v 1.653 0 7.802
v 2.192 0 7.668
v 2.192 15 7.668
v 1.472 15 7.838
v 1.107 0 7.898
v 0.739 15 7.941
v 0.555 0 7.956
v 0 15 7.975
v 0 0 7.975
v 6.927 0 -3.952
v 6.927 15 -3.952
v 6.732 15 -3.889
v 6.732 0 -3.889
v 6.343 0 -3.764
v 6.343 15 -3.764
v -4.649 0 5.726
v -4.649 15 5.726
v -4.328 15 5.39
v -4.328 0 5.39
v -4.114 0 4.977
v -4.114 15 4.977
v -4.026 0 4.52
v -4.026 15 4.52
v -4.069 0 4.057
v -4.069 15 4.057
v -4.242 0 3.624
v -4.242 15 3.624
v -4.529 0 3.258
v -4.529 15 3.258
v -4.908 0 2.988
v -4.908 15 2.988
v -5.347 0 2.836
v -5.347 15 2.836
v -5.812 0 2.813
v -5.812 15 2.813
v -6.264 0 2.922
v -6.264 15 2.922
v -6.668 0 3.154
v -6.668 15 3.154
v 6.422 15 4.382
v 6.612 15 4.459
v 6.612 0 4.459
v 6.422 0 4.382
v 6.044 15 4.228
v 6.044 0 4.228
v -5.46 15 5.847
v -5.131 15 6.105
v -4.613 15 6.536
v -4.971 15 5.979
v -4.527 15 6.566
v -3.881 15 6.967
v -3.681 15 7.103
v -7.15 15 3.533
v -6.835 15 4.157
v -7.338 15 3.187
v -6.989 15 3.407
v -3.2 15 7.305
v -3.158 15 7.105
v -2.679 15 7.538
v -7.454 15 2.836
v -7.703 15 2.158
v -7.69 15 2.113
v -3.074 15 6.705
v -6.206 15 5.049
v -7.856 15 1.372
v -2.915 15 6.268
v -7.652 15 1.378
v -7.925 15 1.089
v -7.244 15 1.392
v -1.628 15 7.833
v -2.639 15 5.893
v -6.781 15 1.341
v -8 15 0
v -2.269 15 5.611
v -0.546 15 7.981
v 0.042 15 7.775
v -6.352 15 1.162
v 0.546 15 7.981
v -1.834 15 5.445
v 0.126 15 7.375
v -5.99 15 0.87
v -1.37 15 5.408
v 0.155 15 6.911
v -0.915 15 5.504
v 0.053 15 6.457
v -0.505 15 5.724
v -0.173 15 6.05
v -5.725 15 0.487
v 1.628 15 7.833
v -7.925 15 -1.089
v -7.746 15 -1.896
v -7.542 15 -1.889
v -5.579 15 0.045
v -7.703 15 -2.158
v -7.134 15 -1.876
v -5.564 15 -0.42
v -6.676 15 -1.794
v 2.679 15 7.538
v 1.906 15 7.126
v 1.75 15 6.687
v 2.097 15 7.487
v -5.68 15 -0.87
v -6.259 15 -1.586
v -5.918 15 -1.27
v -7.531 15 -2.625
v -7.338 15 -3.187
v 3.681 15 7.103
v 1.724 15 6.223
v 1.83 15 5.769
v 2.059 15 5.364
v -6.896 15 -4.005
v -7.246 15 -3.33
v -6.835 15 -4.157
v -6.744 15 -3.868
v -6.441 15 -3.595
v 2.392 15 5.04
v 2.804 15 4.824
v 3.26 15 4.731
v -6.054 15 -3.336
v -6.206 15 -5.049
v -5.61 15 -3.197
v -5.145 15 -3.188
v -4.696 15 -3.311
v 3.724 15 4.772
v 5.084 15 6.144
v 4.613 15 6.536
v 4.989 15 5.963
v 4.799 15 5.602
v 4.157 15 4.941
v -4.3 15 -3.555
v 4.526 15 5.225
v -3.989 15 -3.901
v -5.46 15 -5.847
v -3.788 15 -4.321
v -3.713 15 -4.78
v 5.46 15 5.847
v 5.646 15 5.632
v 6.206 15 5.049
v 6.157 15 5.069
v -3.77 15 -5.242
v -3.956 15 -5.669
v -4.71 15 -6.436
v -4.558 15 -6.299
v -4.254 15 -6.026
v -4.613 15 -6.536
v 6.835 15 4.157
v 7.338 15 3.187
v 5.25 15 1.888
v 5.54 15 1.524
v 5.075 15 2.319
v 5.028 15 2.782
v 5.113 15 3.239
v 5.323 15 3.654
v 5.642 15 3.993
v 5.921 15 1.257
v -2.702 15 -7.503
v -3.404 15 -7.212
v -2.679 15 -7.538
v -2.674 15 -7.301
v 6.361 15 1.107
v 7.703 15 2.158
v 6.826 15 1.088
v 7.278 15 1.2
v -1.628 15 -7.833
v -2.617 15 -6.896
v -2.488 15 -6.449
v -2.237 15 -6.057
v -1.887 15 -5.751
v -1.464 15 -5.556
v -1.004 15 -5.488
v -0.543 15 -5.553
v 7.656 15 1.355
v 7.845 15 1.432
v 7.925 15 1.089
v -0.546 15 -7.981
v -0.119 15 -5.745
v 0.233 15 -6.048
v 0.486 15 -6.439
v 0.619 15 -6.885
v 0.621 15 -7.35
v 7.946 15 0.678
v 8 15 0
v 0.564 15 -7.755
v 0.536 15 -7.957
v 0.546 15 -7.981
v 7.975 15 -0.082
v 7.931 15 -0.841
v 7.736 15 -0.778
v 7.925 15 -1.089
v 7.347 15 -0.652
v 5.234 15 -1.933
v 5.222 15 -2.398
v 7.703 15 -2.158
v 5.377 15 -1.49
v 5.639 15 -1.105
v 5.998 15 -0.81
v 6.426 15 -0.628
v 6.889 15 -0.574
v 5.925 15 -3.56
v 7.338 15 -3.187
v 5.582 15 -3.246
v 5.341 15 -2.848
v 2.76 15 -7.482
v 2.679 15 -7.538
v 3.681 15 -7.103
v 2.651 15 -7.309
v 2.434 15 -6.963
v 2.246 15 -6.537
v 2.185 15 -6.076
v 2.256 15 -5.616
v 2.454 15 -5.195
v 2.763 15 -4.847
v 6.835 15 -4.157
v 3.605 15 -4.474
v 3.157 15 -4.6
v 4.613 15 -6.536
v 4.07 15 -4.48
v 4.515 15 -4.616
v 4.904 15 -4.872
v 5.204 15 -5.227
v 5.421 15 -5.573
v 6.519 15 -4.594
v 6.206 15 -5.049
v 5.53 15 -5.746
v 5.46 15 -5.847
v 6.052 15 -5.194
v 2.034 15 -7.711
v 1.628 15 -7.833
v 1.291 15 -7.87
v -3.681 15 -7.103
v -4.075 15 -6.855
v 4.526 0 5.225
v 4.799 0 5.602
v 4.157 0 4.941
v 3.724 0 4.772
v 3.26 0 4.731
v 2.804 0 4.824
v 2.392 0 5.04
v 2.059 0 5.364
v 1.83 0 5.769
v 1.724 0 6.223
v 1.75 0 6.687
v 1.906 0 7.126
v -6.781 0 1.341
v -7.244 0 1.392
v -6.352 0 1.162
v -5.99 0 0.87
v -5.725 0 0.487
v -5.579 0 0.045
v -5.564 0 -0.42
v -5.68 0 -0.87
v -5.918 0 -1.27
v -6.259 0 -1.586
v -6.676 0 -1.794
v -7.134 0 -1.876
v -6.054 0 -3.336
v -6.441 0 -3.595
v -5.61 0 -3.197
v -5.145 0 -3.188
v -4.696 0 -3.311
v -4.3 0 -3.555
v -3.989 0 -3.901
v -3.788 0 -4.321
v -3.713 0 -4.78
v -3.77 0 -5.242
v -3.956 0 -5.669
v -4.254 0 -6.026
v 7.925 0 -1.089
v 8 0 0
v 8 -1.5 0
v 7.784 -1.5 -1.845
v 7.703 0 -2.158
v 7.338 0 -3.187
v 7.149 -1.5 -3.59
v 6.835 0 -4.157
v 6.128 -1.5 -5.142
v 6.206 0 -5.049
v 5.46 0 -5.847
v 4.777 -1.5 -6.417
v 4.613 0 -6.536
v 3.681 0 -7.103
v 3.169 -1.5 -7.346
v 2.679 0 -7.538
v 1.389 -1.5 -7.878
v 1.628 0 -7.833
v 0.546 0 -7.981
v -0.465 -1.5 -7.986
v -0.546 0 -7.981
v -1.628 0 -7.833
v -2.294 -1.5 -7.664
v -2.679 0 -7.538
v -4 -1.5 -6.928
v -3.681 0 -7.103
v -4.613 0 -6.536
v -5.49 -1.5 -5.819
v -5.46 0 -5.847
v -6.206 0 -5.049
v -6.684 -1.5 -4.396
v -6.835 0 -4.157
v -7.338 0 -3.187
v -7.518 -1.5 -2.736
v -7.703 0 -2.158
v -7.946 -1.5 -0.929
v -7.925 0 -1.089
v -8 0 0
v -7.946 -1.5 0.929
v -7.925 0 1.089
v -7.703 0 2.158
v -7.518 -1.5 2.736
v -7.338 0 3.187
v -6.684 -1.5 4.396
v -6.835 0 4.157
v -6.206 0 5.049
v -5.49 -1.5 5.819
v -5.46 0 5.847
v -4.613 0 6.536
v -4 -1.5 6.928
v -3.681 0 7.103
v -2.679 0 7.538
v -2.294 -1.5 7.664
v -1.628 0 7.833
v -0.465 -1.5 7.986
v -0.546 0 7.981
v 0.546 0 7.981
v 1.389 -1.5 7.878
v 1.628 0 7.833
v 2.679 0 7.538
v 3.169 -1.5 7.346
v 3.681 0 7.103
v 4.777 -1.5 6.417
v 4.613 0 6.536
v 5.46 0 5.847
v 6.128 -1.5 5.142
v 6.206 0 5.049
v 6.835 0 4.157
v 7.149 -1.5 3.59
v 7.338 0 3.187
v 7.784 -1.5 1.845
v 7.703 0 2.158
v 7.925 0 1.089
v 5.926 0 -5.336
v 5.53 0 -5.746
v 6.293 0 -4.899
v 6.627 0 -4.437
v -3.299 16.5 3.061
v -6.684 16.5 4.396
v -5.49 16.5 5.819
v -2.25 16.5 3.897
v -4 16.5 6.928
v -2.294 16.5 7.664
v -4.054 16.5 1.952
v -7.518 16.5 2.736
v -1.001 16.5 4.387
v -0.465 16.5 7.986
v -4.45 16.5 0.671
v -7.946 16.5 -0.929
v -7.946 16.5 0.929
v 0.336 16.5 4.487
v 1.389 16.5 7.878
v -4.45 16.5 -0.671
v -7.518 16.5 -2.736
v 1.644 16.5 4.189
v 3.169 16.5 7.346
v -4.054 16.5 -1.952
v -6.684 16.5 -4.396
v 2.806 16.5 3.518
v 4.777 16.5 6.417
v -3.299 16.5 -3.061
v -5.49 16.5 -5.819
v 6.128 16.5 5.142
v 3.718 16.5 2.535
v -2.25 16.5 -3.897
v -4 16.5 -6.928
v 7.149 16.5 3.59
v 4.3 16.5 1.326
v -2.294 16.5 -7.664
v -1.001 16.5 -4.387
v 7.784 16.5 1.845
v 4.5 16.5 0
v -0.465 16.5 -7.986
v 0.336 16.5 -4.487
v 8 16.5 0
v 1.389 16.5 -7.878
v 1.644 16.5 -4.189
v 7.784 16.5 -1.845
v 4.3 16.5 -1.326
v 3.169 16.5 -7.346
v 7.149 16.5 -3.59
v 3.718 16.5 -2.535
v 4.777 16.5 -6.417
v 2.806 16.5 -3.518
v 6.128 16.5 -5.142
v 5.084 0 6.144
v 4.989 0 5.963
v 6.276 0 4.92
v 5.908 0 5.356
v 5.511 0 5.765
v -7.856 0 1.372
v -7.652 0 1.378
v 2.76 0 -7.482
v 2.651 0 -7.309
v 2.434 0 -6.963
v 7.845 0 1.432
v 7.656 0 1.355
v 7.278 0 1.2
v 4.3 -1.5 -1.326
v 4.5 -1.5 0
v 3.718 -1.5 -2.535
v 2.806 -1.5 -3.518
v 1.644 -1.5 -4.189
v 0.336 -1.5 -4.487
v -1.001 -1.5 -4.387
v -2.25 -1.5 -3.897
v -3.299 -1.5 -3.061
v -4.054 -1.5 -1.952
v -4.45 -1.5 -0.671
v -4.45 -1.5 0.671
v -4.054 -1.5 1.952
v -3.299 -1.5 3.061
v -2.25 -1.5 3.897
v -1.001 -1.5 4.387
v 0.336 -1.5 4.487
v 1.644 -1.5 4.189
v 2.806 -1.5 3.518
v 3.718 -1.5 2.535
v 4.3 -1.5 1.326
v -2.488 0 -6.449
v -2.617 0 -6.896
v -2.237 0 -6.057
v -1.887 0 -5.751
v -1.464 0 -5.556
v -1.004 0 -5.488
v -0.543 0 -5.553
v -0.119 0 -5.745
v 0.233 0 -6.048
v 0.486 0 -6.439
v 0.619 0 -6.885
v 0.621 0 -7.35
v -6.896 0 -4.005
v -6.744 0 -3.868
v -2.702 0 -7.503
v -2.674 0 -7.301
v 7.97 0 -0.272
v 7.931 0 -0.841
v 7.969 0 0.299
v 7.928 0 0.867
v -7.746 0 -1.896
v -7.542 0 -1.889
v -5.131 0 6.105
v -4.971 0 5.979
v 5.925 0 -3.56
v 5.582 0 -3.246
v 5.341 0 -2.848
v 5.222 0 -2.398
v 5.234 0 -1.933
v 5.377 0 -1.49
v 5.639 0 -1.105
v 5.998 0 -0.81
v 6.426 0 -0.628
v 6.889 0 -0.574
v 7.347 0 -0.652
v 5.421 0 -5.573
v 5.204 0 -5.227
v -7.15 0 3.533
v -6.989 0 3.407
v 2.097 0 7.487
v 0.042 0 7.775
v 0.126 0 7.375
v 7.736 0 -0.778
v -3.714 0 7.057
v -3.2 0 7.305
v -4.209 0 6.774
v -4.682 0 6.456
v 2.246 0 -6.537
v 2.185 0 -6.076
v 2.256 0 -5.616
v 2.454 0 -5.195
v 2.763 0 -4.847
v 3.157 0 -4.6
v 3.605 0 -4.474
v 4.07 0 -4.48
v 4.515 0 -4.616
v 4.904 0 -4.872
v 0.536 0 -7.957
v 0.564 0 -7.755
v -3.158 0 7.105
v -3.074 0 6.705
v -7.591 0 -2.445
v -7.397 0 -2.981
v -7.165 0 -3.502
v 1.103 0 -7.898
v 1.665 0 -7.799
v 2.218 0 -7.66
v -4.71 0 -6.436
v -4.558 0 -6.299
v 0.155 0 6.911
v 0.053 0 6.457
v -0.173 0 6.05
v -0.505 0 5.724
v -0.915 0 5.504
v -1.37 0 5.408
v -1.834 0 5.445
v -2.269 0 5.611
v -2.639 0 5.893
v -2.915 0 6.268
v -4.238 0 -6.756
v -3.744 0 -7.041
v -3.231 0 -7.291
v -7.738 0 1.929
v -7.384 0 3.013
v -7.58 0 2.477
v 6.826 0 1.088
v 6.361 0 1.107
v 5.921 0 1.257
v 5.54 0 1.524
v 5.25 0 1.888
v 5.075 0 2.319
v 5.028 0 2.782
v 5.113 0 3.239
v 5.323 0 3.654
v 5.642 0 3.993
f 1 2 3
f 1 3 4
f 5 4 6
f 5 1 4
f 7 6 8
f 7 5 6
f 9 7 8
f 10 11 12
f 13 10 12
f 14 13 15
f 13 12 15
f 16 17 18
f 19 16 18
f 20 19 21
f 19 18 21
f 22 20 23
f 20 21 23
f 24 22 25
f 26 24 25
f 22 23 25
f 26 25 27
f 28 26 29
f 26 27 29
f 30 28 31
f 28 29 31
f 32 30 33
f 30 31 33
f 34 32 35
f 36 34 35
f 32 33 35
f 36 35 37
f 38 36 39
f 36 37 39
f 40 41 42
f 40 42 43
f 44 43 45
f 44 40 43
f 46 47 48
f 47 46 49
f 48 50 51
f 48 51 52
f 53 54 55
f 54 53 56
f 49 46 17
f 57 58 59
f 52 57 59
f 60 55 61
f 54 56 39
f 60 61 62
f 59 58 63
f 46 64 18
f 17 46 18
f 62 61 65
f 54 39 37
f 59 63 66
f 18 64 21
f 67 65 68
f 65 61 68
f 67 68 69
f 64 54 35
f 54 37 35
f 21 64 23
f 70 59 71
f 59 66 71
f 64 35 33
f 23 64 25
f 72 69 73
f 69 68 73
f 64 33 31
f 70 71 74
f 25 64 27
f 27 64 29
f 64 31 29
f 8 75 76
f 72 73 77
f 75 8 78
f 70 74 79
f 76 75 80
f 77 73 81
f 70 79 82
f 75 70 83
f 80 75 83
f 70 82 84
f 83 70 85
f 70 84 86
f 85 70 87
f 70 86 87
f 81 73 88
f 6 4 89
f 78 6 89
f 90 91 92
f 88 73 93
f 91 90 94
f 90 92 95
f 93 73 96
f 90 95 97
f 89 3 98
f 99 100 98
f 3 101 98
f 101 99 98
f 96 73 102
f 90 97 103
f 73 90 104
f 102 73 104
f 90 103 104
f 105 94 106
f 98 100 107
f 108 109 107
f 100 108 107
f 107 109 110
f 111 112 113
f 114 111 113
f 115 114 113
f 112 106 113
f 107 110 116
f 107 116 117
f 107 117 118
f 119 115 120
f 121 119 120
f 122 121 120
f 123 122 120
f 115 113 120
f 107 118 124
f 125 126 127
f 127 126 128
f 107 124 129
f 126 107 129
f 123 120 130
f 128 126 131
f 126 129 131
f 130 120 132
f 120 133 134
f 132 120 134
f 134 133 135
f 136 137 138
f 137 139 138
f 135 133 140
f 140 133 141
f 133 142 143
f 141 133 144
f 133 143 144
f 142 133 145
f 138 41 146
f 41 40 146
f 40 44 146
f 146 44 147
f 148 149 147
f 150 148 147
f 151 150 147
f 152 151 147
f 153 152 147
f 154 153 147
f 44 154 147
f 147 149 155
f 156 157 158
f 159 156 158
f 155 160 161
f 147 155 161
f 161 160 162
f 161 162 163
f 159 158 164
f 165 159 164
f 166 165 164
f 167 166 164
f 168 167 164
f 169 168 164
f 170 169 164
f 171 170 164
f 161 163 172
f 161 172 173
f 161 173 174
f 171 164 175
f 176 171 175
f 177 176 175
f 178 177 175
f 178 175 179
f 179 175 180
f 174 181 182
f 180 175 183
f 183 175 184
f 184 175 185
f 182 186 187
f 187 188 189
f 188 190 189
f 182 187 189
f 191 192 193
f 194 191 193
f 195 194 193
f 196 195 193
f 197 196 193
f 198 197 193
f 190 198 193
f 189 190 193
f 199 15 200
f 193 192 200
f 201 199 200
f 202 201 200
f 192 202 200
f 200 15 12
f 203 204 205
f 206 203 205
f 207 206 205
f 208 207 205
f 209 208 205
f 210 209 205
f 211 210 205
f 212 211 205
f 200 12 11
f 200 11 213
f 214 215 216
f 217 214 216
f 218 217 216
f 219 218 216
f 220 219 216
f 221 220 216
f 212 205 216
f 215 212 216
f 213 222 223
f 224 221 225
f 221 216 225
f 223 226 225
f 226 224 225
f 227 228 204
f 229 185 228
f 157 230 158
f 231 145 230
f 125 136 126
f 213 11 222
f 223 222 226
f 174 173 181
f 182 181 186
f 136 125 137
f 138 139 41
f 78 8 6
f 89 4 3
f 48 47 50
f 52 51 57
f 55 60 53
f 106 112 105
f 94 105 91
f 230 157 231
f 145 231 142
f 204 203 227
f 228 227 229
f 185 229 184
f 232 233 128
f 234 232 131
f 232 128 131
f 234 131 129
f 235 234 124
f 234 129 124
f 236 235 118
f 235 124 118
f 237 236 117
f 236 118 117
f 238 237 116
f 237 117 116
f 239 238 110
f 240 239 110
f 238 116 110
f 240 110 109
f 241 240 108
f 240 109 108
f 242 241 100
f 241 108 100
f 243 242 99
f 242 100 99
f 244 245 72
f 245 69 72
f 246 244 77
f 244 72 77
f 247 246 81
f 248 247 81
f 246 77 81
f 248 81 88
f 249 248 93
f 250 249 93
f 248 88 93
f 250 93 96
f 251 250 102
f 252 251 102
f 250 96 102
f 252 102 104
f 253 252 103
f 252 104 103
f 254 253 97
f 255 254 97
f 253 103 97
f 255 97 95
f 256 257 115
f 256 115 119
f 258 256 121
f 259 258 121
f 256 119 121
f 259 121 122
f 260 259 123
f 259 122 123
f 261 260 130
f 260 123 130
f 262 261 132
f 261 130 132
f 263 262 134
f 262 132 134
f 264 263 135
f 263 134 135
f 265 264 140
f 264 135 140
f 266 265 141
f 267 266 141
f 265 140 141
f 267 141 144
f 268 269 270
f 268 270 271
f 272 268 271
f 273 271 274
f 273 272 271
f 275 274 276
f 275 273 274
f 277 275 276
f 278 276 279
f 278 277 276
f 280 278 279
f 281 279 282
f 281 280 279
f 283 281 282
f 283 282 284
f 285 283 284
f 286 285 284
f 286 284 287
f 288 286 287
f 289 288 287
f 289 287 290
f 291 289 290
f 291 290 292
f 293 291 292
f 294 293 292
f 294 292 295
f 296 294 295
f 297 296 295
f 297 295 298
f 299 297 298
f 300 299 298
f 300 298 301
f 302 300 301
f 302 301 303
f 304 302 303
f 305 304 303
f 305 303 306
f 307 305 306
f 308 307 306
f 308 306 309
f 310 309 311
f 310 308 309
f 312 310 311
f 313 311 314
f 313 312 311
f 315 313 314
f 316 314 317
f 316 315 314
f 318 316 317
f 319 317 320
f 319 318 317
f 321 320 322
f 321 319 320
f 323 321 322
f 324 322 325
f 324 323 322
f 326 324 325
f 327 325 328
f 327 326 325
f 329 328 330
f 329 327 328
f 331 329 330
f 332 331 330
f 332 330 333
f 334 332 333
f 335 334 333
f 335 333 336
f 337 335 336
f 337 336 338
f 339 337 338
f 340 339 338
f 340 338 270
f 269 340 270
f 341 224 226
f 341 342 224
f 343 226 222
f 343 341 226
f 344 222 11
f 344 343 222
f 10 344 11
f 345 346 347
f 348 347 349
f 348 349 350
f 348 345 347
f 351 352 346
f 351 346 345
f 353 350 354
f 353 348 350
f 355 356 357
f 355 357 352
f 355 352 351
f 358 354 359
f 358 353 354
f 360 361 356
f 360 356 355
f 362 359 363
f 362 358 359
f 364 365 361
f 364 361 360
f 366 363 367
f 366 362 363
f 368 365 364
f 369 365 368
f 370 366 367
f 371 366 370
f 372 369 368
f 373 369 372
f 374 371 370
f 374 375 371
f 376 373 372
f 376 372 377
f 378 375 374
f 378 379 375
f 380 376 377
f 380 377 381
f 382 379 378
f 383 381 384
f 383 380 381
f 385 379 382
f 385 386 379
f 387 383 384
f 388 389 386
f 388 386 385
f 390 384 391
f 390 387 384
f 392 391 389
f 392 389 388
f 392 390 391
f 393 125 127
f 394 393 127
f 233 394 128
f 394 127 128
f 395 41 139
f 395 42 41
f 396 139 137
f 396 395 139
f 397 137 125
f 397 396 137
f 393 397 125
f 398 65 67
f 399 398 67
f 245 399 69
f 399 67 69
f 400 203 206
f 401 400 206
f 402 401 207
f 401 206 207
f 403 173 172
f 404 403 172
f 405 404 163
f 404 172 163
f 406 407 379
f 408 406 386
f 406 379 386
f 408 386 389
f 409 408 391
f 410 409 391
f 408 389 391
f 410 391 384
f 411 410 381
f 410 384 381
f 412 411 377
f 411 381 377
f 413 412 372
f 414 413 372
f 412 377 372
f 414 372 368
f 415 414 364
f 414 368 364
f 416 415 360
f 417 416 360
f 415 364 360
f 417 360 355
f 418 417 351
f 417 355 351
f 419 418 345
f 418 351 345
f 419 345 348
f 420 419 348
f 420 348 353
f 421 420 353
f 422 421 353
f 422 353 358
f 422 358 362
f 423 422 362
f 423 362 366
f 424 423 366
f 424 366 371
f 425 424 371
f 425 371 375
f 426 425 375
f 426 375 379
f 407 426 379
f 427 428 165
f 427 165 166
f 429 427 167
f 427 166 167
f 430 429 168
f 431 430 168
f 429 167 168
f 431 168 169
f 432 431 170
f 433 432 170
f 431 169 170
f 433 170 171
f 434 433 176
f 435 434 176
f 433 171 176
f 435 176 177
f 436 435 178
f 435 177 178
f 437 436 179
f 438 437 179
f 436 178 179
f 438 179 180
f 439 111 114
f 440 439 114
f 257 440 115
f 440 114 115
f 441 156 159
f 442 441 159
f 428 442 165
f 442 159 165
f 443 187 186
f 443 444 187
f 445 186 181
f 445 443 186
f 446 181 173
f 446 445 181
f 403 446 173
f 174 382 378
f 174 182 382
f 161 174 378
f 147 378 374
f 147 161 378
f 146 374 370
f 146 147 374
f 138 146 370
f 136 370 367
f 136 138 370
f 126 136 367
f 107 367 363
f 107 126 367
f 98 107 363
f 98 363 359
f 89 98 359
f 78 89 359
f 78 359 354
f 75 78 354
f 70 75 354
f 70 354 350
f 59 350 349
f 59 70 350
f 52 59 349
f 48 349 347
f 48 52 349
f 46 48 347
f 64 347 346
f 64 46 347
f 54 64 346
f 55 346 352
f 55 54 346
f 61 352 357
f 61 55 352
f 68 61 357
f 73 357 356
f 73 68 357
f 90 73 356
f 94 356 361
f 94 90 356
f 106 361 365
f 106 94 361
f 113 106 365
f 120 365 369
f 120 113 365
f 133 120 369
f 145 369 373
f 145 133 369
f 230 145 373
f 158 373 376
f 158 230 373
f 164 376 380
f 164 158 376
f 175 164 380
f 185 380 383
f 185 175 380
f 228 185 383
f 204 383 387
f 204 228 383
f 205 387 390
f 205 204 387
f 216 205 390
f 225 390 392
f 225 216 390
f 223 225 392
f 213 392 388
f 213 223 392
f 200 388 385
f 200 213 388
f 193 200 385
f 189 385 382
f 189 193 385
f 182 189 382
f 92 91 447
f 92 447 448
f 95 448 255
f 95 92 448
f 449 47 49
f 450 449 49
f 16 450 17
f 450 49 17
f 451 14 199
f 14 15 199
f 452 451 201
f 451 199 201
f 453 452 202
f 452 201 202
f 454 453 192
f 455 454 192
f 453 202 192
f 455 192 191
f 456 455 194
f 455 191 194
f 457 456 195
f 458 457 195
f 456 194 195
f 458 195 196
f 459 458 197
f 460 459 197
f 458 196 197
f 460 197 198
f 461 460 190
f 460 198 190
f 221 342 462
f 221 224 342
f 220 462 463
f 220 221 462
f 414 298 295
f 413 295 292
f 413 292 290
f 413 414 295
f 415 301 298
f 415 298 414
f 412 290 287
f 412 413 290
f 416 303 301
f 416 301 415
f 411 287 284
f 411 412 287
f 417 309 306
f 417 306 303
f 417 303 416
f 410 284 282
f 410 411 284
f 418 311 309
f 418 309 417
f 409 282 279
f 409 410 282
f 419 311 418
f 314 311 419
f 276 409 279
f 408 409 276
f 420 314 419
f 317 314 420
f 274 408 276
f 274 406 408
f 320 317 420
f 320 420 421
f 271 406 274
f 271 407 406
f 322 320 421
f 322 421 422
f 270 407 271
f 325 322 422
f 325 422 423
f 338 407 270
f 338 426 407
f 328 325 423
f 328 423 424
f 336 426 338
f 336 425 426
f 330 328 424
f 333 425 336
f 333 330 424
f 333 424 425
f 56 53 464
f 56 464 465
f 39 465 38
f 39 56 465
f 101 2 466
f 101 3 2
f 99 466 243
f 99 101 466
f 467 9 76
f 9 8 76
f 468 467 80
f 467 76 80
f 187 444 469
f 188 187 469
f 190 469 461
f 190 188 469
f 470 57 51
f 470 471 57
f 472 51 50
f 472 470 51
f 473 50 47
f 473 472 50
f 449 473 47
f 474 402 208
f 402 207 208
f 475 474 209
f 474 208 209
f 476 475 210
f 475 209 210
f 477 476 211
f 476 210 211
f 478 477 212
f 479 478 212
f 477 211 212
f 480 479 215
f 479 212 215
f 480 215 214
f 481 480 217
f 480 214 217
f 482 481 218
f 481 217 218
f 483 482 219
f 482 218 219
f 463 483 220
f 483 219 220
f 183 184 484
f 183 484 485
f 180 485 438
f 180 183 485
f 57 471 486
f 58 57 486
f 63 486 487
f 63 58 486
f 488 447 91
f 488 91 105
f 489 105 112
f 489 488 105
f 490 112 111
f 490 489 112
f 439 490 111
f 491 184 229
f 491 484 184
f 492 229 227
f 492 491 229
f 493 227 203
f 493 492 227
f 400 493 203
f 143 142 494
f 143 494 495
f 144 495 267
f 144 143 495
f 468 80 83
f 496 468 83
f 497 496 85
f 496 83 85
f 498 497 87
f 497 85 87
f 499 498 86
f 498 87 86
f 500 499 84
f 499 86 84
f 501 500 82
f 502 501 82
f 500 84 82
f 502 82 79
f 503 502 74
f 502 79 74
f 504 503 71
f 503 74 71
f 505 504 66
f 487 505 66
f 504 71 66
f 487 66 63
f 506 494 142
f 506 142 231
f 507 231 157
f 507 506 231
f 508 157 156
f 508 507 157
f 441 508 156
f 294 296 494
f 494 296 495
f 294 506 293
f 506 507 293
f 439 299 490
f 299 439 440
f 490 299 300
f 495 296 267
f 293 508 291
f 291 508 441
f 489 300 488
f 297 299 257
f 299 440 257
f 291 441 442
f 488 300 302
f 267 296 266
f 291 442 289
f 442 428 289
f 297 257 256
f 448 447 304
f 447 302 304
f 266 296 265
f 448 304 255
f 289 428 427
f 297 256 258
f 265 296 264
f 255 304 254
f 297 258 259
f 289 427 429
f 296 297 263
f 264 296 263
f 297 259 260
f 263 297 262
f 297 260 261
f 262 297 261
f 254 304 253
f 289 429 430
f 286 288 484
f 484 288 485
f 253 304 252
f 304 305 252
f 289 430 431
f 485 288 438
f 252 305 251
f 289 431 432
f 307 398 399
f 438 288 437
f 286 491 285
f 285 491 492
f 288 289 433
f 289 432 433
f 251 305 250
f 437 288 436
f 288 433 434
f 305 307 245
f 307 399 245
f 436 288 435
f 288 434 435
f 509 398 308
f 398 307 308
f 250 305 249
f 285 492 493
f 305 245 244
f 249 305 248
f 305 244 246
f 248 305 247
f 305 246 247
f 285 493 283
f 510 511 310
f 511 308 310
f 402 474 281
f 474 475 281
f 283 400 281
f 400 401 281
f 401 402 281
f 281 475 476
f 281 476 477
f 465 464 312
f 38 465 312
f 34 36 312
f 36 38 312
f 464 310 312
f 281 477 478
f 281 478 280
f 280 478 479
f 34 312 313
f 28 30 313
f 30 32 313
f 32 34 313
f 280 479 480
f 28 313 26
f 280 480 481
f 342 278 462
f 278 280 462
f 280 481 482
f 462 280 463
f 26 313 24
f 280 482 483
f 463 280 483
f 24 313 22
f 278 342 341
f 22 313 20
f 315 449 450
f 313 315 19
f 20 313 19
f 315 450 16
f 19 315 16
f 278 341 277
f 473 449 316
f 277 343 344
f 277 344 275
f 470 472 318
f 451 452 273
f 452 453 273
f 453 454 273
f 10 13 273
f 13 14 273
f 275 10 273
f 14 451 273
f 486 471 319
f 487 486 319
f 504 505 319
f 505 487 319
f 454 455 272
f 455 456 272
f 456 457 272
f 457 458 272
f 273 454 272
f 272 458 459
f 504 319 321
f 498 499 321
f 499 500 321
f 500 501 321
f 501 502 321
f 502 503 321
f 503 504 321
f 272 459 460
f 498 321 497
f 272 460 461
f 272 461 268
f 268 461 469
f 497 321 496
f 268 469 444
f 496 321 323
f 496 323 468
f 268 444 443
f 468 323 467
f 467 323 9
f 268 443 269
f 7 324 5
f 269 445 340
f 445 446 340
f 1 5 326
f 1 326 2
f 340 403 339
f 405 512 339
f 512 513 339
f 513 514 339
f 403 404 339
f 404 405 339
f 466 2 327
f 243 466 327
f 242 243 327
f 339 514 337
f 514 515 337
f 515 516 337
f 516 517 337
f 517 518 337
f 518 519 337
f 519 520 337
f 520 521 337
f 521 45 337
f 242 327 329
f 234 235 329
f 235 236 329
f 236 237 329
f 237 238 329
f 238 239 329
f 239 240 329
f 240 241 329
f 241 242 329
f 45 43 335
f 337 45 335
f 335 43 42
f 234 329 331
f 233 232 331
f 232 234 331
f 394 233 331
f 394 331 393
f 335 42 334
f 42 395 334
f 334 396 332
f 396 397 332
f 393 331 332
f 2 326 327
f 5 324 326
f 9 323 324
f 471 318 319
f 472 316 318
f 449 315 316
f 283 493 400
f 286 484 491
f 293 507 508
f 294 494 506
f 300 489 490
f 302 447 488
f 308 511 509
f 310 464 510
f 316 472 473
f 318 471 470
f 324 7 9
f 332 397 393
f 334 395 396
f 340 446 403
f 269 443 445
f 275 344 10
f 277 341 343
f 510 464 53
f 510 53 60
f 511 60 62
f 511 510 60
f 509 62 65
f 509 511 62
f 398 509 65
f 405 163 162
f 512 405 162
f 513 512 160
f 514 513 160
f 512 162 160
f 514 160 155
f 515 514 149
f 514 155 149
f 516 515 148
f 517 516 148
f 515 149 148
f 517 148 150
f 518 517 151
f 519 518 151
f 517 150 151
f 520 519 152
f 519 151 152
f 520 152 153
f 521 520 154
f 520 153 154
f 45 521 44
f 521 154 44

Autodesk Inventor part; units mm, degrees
ref_plane "YZ Plane" through (0, 0, 0) normal (1, 0, 0) x (0, 1, 0)
ref_plane "XZ Plane" through (0, 0, 0) normal (0, 1, 0) x (-1, 0, 0)
ref_plane "XY Plane" through (0, 0, 0) normal (0, 0, 1) x (1, 0, 0)
sketch "Esquisse2" plane through (0, 0, 0) normal (0, 1, 0) x (-1, 0, 0)
  circle A0 centre (0, 0) radius 7.975
  dimension "d0" = 15.95
extrude "Extrusion1" add sketch "Esquisse2" along normal blind 15
sketch "Esquisse4" plane through (0, 15, 0) normal (0, 1, 0) x (1, 0, 0)
  circle A0 centre (0, 0) radius 7.975 projected
  circle A1 centre (0, 0) radius 7.975 projected
  arc A2 (-3.2, -7.3048) -> (0, -7.975) centre (0, 0) ccw
  line L0 (-0.0068, -0.0109) -> (-5.0602, -8.1445)
  line L1 (0, -6.3735) -> (0, 5.2233) construction
  line L2 (-3.2, -7.3048) -> (0, -7.975) construction
  line L3 (-3.2, -7.3048) -> (-3.0743, -6.7048)
  line L4 (0, -7.975) -> (0.1257, -7.375)
  arc A3 (0.1257, -7.375) -> (-3.0743, -6.7048) centre (-1.4743, -7.0399) ccw
  line L5 (-3.0743, -6.7048) -> (0.1257, -7.375) construction
  arc A4 (-7.1498, -3.5328) -> (-5.1314, -6.1048) centre (0, 0) ccw
  line L6 (-5.1314, -6.1048) -> (-7.1498, -3.5328) construction
  line L7 (-5.1314, -6.1048) -> (-4.6492, -5.7264)
  line L8 (-7.1498, -3.5328) -> (-6.6676, -3.1544)
  arc A5 (-4.6492, -5.7264) -> (-6.6676, -3.1544) centre (-5.6584, -4.4404) ccw
  line L9 (-4.6492, -5.7264) -> (-6.6676, -3.1544) construction
  line L10 (-5.1314, -6.1048) -> (-3.2, -7.3048) construction
  line L11 (0, 0) -> (-9.6935, -3.168)
  arc A6 (-4.7097, 6.4358) -> (-6.8963, 4.0051) centre (0, 0) ccw
  line L12 (-6.8963, 4.0051) -> (-4.7097, 6.4358) construction
  line L13 (-6.8963, 4.0051) -> (-6.4406, 3.5951)
  line L14 (-4.7097, 6.4358) -> (-4.254, 6.0258)
  arc A7 (-6.4406, 3.5951) -> (-4.254, 6.0258) centre (-5.3473, 4.8105) ccw
  line L15 (-6.4406, 3.5951) -> (-4.254, 6.0258) construction
  arc A8 (-7.7463, 1.8961) -> (-7.8562, -1.3715) centre (0, 0) ccw
  line L16 (-7.7463, 1.8961) -> (-7.8562, -1.3715) construction
  line L17 (-7.7463, 1.8961) -> (-7.1336, 1.8755)
  line L18 (-7.8562, -1.3715) -> (-7.2435, -1.3921)
  arc A9 (-7.2435, -1.3921) -> (-7.1336, 1.8755) centre (-7.1886, 0.2417) ccw
  line L19 (-7.1336, 1.8755) -> (-7.2435, -1.3921) construction
  line L20 (-7.7463, 1.8961) -> (-6.8963, 4.0051) construction
  line L21 (-7.8562, -1.3715) -> (-7.1498, -3.5328) construction
  line L22 (0, 0) -> (-3.9831, 7.4909)
  arc A10 (6.6117, -4.4594) -> (7.8454, -1.4316) centre (0, 0) ccw
  line L23 (7.8454, -1.4316) -> (6.6117, -4.4594) construction
  line L24 (7.8454, -1.4316) -> (7.2777, -1.2003)
  line L25 (6.6117, -4.4594) -> (6.044, -4.228)
  arc A11 (7.2777, -1.2003) -> (6.044, -4.228) centre (6.6609, -2.7142) ccw
  line L26 (7.2777, -1.2003) -> (6.044, -4.228) construction
  arc A12 (7.9306, 0.8406) -> (6.9268, 3.9522) centre (0, 0) ccw
  line L27 (7.9306, 0.8406) -> (6.9268, 3.9522) construction
  line L28 (7.9306, 0.8406) -> (7.3472, 0.6524)
  line L29 (6.9268, 3.9522) -> (6.3434, 3.764)
  arc A13 (6.3434, 3.764) -> (7.3472, 0.6524) centre (6.8453, 2.2082) ccw
  line L30 (7.3472, 0.6524) -> (6.3434, 3.764) construction
  line L31 (7.9306, 0.8406) -> (7.8454, -1.4316) construction
  line L32 (0.5357, 7.957) -> (0.6208, 7.3499)
  arc A14 (-2.617, 6.8962) -> (0.6208, 7.3499) centre (-0.9981, 7.1231) ccw
  line L33 (0.6208, 7.3499) -> (-2.617, 6.8962) construction
  line L34 (0.5357, 7.957) -> (-2.7021, 7.5033) construction
  arc A15 (0.5357, 7.957) -> (-2.7021, 7.5033) centre (0, 0) ccw
  line L35 (-2.7021, 7.5033) -> (-2.617, 6.8962)
  line L36 (2.7595, 7.4824) -> (0.5357, 7.957) construction
  line L37 (2.7595, 7.4824) -> (2.434, 6.9629)
  line L38 (2.434, 6.9629) -> (5.2044, 5.2269) construction
  line L39 (2.7595, 7.4824) -> (5.5299, 5.7463) construction
  arc A16 (5.5299, 5.7463) -> (2.7595, 7.4824) centre (0, 0) ccw
  arc A17 (2.434, 6.9629) -> (5.2044, 5.2269) centre (3.8192, 6.0949) ccw
  line L40 (5.5299, 5.7463) -> (5.2044, 5.2269)
  line L41 (5.5299, 5.7463) -> (6.9268, 3.9522) construction
  line L42 (-4.7097, 6.4358) -> (-2.7021, 7.5033) construction
  line L43 (0, 0) -> (2.483, -17.7205) construction
  arc A18 (2.1919, -7.6679) -> (5.0845, -6.144) centre (0, 0) ccw
  line L44 (5.0845, -6.144) -> (2.1919, -7.6679) construction
  line L45 (5.0845, -6.144) -> (4.7988, -5.6016)
  line L46 (2.1919, -7.6679) -> (1.9062, -7.1255)
  arc A19 (4.7988, -5.6016) -> (1.9062, -7.1255) centre (3.3525, -6.3636) ccw
  line L47 (4.7988, -5.6016) -> (1.9062, -7.1255) construction
  line L48 (6.6117, -4.4594) -> (5.0845, -6.144) construction
  line L49 (2.1919, -7.6679) -> (0, -7.975) construction
  point P0 (-7.7463, 1.8961)
  point P1 (-7.8562, -1.3715)
  point P2 (-4.7097, 6.4358)
  point P3 (0.5357, 7.957)
  point P4 (-2.7021, 7.5033)
  point P5 (5.5299, 5.7463)
  point P6 (2.7595, 7.4824)
  point P7 (7.9306, 0.8406)
  point P8 (6.9268, 3.9522)
  point P9 (6.6117, -4.4594)
  point P10 (7.8454, -1.4316)
  point P11 (-3.2, -7.3048)
  point P12 (0, -7.975)
  point P13 (-7.1498, -3.5328)
  point P14 (-5.1314, -6.1048)
  point P15 (5.0845, -6.144)
  dimension "d14" = 3.2
  dimension "d28" = 0.6
  dimension "d30" = 1.2
extrude "Extrusion6" cut sketch "Esquisse4" against normal blind 15 contours L28 A13 L29 A0 | A0 L25 A11 L24 | L40 A17 L37 A0 | A0 L46 A19 L45 | L32 A14 L35 A0 | A0 L3 A3 L4 | L14 A7 L13 A0 | A0 L8 A5 L7 | L17 A9 L18 A0
sketch "Esquisse6" plane through (0, 15, 0) normal (0, 1, 0) x (1, 0, 0)
  circle A0 centre (0, 0) radius 8
  dimension "d19" = 16
extrude "Extrusion3" add sketch "Esquisse6" along normal blind 1.5
sketch "Esquisse7" plane through (0, 0, 0) normal (0, -1, 0) x (1, 0, 0)
  circle A0 centre (0, 0) radius 8
extrude "Extrusion4" add sketch "Esquisse7" along normal blind 1.5
sketch "Esquisse8" plane through (0, 16.5, 0) normal (0, 1, 0) x (1, 0, 0)
  circle A0 centre (0, 0) radius 4.5
  dimension "d24" = 9
extrude "Extrusion5" cut sketch "Esquisse8" against normal through all
properties part number "Pièce_moteur_courroie_test_3"
